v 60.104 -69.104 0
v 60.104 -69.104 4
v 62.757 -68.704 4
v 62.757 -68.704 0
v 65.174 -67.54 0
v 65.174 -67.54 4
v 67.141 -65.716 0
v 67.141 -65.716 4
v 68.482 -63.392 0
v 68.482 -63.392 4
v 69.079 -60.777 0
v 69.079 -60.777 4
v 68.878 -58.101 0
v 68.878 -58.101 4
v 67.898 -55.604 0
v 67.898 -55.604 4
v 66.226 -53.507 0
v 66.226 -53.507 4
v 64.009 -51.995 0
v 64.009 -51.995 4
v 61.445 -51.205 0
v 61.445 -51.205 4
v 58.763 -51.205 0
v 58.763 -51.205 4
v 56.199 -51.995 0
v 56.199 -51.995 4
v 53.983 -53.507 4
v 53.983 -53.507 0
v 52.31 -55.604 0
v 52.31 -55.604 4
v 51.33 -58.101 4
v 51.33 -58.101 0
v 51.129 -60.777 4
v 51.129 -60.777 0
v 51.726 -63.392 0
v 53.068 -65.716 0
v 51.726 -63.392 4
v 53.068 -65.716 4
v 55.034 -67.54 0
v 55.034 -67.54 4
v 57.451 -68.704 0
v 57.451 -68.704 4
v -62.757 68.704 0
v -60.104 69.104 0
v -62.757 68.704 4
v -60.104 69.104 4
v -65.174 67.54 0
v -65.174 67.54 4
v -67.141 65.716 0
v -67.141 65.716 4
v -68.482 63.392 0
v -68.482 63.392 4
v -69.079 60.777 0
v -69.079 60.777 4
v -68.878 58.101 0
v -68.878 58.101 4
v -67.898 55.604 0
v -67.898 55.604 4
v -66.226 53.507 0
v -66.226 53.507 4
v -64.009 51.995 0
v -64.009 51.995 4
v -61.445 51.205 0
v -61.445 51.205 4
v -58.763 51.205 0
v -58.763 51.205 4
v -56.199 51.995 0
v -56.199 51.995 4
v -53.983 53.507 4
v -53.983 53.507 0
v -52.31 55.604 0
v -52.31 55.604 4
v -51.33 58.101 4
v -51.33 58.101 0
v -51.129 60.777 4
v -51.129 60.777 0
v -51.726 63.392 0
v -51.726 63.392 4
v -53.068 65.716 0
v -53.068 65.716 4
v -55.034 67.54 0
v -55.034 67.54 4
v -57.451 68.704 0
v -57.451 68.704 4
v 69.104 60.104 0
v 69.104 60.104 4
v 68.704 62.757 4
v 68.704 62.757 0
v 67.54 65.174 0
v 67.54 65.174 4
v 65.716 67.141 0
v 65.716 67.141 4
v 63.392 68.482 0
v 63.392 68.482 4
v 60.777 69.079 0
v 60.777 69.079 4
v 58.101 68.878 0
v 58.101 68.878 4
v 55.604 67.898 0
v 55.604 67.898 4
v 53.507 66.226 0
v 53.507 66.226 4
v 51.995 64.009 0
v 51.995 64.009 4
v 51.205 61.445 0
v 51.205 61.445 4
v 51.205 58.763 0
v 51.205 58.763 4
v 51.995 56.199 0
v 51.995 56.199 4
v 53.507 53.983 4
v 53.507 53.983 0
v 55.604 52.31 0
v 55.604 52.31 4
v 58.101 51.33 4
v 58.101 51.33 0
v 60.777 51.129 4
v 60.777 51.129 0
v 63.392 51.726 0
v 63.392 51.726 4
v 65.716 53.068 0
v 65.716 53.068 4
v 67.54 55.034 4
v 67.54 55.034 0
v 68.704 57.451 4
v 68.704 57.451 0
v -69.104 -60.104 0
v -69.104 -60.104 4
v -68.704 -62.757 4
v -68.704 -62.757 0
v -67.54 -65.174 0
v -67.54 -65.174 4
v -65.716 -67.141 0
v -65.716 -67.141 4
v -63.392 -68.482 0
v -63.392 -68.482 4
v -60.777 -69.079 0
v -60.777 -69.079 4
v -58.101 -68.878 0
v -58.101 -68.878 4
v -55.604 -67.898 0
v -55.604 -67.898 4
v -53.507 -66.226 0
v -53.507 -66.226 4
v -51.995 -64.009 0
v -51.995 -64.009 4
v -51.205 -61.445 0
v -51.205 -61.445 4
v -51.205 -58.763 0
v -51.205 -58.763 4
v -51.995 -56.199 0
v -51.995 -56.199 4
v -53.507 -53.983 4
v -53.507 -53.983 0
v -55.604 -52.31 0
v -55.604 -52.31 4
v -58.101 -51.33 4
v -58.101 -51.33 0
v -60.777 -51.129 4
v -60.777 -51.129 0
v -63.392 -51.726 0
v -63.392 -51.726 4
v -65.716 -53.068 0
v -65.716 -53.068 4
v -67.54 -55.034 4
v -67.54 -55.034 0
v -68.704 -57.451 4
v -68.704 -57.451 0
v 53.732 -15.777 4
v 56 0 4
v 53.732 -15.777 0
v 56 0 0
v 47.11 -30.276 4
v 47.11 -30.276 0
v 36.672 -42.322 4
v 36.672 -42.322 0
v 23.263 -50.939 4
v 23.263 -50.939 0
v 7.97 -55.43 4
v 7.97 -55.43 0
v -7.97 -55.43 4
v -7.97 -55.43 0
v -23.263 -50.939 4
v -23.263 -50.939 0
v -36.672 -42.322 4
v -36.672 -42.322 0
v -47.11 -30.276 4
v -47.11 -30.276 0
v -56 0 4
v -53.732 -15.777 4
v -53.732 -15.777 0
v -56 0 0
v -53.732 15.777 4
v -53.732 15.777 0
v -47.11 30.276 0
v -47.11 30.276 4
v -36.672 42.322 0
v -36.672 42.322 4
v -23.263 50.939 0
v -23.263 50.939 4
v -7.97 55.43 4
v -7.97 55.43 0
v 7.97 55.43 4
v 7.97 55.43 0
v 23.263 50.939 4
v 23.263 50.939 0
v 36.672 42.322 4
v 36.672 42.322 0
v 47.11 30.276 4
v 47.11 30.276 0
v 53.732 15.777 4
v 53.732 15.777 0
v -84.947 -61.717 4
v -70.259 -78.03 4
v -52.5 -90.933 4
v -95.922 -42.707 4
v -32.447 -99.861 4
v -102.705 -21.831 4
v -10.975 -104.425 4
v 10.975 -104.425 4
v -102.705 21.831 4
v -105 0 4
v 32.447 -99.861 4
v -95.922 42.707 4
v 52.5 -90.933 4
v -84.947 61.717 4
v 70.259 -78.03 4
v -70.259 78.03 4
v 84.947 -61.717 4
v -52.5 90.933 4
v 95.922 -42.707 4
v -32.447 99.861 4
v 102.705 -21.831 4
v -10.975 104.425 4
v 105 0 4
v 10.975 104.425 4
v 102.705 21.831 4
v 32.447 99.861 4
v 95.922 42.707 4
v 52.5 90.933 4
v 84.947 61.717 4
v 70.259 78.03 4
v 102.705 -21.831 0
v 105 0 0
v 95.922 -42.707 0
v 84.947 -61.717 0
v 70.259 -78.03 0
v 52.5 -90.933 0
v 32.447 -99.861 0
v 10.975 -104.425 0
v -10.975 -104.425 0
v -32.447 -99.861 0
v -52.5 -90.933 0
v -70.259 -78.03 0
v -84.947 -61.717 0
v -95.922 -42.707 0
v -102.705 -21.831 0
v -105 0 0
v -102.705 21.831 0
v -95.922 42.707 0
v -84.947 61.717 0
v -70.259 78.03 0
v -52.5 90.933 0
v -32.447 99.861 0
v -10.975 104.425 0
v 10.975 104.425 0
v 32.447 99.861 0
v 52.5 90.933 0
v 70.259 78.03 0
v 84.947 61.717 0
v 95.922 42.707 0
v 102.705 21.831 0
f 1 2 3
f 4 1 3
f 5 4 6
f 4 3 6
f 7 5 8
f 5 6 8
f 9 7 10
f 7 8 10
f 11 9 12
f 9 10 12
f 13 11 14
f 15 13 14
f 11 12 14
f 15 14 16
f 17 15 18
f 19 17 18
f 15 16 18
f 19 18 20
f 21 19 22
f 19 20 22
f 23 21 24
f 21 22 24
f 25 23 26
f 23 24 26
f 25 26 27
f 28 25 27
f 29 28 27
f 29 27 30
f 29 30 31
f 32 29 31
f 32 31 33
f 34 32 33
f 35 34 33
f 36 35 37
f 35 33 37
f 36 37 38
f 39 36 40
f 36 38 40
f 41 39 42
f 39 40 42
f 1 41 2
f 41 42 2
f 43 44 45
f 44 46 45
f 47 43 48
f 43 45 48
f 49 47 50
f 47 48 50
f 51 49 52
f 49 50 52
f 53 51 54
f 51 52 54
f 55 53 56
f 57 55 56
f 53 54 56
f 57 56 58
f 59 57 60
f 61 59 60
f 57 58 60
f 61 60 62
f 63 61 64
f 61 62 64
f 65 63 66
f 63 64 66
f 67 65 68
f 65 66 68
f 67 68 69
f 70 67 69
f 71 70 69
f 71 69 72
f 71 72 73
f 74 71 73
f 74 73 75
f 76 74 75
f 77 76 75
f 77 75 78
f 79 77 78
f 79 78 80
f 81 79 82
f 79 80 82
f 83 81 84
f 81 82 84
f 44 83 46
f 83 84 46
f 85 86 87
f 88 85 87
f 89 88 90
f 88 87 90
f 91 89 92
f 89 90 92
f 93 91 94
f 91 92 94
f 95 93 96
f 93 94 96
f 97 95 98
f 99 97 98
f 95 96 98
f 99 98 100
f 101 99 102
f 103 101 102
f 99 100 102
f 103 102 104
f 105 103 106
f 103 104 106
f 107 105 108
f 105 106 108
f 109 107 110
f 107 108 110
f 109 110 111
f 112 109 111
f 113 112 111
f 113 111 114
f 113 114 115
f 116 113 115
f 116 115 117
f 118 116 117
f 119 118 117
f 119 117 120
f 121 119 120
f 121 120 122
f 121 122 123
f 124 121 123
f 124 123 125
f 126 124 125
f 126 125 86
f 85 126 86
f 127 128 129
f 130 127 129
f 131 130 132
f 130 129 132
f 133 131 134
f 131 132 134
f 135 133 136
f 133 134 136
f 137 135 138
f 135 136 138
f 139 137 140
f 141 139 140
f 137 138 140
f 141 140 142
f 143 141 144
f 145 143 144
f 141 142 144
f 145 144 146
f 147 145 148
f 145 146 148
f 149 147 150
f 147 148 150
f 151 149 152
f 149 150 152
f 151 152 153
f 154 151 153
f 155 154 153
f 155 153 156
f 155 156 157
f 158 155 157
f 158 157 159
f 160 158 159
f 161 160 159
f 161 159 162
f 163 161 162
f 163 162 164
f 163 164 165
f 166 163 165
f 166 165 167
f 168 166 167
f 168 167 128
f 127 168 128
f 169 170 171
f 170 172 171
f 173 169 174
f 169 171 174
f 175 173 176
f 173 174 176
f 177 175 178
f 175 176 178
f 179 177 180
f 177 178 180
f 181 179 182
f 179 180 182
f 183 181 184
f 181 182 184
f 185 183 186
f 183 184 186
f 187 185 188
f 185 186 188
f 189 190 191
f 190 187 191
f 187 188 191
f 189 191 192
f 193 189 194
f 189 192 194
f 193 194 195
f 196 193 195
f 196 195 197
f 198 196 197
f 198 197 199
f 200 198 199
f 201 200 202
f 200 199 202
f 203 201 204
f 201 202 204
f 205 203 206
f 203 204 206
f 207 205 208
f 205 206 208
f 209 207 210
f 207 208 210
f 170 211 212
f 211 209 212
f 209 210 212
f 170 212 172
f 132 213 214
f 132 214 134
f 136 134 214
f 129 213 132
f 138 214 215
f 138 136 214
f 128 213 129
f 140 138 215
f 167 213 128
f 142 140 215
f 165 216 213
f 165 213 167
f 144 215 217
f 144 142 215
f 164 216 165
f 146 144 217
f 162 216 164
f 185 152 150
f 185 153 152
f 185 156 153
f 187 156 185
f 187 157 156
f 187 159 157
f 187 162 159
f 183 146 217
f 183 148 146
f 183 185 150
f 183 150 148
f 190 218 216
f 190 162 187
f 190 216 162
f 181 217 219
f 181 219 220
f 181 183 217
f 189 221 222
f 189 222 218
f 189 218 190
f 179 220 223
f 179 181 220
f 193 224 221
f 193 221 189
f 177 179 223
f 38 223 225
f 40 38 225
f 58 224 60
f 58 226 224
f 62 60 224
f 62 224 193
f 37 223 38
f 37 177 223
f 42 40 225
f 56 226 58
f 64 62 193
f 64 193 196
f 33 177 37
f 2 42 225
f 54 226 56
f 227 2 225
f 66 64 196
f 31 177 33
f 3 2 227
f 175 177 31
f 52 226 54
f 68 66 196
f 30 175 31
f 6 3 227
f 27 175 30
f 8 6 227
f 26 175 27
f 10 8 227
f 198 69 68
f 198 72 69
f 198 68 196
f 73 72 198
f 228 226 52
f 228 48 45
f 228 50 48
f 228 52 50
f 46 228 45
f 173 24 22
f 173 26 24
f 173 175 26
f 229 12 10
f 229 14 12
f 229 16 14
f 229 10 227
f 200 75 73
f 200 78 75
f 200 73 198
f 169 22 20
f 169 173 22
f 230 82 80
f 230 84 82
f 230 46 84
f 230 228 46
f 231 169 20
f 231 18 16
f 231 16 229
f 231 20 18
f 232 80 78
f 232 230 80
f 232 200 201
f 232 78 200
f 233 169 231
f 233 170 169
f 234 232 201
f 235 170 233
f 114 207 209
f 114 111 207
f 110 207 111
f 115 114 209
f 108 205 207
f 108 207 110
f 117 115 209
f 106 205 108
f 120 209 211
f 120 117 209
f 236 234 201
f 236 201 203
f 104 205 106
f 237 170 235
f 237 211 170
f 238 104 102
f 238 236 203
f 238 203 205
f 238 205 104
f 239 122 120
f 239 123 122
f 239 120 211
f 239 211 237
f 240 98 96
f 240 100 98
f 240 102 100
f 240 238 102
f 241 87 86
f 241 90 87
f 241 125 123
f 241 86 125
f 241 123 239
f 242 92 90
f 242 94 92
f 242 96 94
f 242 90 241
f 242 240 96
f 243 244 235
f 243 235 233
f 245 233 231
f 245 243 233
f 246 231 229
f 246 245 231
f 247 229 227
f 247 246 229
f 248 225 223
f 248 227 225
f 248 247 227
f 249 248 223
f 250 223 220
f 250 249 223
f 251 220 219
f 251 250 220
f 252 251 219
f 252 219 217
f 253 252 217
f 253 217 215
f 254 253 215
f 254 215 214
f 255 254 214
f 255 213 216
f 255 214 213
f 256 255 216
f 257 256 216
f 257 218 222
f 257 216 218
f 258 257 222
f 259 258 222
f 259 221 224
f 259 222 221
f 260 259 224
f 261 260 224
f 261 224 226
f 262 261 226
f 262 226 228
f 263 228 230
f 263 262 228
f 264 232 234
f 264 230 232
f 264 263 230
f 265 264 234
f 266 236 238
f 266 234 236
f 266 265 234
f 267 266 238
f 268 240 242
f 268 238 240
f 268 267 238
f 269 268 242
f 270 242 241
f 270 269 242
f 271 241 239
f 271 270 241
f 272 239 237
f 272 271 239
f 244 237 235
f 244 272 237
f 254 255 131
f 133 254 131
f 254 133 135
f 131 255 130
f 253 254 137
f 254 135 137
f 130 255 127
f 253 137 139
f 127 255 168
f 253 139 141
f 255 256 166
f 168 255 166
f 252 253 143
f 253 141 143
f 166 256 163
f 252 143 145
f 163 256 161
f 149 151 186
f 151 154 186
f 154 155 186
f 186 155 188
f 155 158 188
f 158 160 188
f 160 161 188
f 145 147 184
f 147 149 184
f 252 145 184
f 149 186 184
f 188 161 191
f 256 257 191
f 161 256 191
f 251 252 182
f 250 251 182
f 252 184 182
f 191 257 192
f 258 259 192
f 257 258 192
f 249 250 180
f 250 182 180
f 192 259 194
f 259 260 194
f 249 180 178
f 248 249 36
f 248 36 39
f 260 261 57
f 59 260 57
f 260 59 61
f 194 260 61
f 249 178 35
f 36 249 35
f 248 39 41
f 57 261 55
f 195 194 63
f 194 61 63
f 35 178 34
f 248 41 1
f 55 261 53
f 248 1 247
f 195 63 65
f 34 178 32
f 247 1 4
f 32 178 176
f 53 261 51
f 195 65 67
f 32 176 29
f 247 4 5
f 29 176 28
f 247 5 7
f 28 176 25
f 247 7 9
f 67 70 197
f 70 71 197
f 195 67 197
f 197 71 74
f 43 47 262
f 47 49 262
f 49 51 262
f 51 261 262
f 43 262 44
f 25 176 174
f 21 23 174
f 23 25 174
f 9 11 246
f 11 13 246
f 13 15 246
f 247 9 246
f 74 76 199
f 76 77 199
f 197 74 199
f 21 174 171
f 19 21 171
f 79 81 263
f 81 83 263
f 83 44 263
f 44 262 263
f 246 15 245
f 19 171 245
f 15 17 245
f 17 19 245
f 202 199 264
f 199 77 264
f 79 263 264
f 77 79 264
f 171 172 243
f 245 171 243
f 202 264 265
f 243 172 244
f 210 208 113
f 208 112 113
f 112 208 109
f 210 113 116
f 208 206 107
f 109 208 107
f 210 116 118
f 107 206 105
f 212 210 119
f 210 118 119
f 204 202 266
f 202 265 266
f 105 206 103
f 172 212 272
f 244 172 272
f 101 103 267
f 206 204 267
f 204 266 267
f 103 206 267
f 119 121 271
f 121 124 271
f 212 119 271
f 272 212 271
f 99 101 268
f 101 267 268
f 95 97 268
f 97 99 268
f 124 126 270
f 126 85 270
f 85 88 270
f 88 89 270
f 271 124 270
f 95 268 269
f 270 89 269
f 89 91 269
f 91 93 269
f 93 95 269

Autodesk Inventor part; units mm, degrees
ref_plane "YZ Plane" through (0, 0, 0) normal (1, 0, 0) x (0, 1, 0)
ref_plane "XZ Plane" through (0, 0, 0) normal (0, 1, 0) x (-1, 0, 0)
ref_plane "XY Plane" through (0, 0, 0) normal (0, 0, 1) x (1, 0, 0)
sketch "Sketch1" plane through (0, 0, 0) normal (0, 0, 1) x (1, 0, 0)
  circle A0 centre (0, 0) radius 56
  circle A1 centre (0, 0) radius 105
  dimension "d22" = 112
  dimension "d23" = 210
extrude "Plate1" add sketch "Sketch1" along normal blind 4
sketch "Sketch5" plane through (0, 0, 4) normal (0, 0, 1) x (1, 0, 0)
  circle A0 centre (60.1041, 60.1041) radius 9
  circle A1 centre (0, 0) radius 85 construction
  line L0 (60.1041, 60.1041) -> (0, 0) construction
  line L1 (0, 0) -> (0, 85) construction
  dimension "d24" = 18
  dimension "d25" = 170
  dimension "d31" = 45
extrude "Cut1" cut sketch "Sketch5" against normal blind 4
pattern_circular "Circular Pattern1" count 4 over 360 about axis through (0, 0, 0) along (0, 0, 1) of "Cut1"
equation "\"d22\" = Flange_Tube_diam"
equation "\"d23\" = Flange_D_outer"
equation "\"d24\" = Flange_d_hole_diam"
equation "\"d25\" = Flange_D1_hole_center"
equation "\"d26\" = Thickness"
equation "\"d2\" = Thickness"
equation "\"BendReliefWidth\" = Thickness"
equation "\"BendReliefDepth\" = 0.5 * Thickness"
equation "\"CornerReliefSize\" = 4 * Thickness"
equation "\"MinimumRemnant\" = 2 * Thickness"
equation "\"TransitionRadius\" = BendRadius"
equation "\"JacobiRadiusSize\" = BendRadius"
equation "\"GapSize\" = Thickness"
equation "\"Flange_D_outer\" = 210"
equation "\"Flange_D1_hole_center\" = 170"
equation "\"Flange_d_hole_diam\" = 18"
equation "\"Flange_Tube_diam\" = 112"
equation "\"Thickness\" = 4"
equation "\"BendRadius\" = 6"
properties part number "drain flange" material "Stainless Steel"
